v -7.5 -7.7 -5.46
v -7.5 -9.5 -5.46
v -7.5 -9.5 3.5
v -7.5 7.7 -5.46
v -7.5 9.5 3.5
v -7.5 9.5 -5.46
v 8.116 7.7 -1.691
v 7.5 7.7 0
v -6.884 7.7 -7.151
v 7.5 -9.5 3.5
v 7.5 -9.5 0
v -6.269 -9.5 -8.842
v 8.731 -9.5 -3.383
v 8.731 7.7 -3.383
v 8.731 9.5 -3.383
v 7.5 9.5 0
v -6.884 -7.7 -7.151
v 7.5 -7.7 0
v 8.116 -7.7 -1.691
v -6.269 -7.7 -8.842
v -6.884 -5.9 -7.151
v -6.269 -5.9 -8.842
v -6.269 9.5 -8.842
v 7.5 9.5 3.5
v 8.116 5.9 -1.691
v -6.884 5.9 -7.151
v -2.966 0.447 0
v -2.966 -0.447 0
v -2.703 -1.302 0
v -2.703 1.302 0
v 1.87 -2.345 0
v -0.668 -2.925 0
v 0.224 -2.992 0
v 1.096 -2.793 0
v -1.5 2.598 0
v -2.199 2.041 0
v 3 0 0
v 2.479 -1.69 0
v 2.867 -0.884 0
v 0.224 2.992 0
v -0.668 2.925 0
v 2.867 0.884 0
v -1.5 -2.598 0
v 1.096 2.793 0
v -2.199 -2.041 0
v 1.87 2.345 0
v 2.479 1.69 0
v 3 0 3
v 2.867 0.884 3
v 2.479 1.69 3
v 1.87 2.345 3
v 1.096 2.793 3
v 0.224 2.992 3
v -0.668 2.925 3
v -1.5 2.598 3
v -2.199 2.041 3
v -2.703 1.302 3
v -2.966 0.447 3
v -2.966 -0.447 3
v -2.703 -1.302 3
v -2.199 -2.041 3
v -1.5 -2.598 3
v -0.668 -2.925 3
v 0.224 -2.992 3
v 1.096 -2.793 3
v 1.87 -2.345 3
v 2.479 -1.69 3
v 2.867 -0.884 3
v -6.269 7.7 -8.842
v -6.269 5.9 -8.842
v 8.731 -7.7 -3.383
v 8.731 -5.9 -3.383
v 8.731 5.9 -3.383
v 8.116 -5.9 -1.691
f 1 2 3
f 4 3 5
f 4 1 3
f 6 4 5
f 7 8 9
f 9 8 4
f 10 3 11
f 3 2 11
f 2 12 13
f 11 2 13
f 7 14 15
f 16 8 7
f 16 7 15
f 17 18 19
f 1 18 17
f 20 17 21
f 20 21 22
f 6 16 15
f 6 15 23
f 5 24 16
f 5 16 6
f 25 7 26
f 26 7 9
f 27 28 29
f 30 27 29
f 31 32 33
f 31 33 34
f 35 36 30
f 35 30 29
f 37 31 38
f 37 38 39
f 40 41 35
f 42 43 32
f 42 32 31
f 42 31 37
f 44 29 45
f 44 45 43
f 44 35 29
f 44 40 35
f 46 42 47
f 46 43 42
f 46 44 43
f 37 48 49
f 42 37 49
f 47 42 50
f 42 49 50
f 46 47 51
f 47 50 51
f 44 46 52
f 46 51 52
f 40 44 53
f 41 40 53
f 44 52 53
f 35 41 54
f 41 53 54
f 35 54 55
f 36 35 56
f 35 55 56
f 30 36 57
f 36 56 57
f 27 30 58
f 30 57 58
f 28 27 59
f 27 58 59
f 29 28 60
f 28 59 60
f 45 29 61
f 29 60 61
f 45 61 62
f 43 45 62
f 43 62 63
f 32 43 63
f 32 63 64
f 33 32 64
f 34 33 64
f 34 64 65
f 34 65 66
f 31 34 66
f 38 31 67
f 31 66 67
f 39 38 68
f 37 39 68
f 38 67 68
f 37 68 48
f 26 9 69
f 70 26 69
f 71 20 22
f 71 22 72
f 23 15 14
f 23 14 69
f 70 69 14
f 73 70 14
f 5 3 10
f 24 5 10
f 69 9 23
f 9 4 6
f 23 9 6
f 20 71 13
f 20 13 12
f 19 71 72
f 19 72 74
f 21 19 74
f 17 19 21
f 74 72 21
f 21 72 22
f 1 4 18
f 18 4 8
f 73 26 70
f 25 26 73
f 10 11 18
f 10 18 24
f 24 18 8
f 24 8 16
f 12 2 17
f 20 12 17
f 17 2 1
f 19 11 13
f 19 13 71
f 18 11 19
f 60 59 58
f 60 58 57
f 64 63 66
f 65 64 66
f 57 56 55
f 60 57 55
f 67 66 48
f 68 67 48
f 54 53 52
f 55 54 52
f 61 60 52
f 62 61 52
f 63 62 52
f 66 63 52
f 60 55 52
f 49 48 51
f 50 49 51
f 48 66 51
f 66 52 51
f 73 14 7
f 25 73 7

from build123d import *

# Parameters (mm, degrees)
SKIZZE1_W                       = 15
SKIZZE1_H                       = 19
AUFSATZ_LINEAR_AUSTRAGEN1_DEPTH = 3
AUFSATZ_LINEAR_AUSTRAGEN2_DEPTH = 19
SKIZZE5_R                       = 3
SCHNITT_LINEAR_AUSTRAGEN1_DEPTH = 3
SKIZZE6_W                       = 15
SKIZZE6_H                       = 19
AUFSATZ_LINEAR_AUSTRAGEN3_DEPTH = 0.5
SKIZZE7_W                       = 15.962666587
SKIZZE7_H                       = 1.8
AUFSATZ_LINEAR_AUSTRAGEN4_DEPTH = 3.6
AUFSATZ_LINEAR_AUSTRAGEN5_DEPTH = 1.8
AUFSATZ_LINEAR_AUSTRAGEN6_DEPTH = 1.8


with BuildPart() as part:
    # Skizze1 → Aufsatz-Linear austragen1 (new body)
    with BuildSketch(Plane.XY):
        Rectangle(SKIZZE1_W, SKIZZE1_H)
    extrude(amount=AUFSATZ_LINEAR_AUSTRAGEN1_DEPTH)

    # Skizze3 → Aufsatz-Linear austragen2 (add)
    with BuildSketch(Plane(origin=(0, 9.5, 0), x_dir=(1, 0, 0), z_dir=(0, 1, 0))):
        Polygon((-7.5, 0), (-7.5, 5.459553514), (7.5, 0), align=None)
    extrude(amount=-AUFSATZ_LINEAR_AUSTRAGEN2_DEPTH)

    # Skizze5 → Schnitt-Linear austragen1 (cut)
    with BuildSketch(Plane.XY.offset(3)):
        Circle(SKIZZE5_R)
    extrude(amount=-SCHNITT_LINEAR_AUSTRAGEN1_DEPTH, mode=Mode.SUBTRACT)

    # Skizze6 → Aufsatz-Linear austragen3 (add)
    with BuildSketch(Plane.XY.offset(3)):
        Rectangle(SKIZZE6_W, SKIZZE6_H)
    extrude(amount=AUFSATZ_LINEAR_AUSTRAGEN3_DEPTH)

    # Skizze7 → Aufsatz-Linear austragen4 (add)
    with BuildSketch(Plane(origin=(0.877333338, 0, -2.410453536), x_dir=(-0.939692621, 0, -0.342020143), z_dir=(0.342020143, 0, -0.939692621))):
        with Locations((0.933638638, 8.6)):
            Rectangle(SKIZZE7_W, SKIZZE7_H)
        with Locations((0.933638638, -8.6)):
            Rectangle(SKIZZE7_W, SKIZZE7_H)
    extrude(amount=AUFSATZ_LINEAR_AUSTRAGEN4_DEPTH)

    # Skizze10 → Aufsatz-Linear austragen5 (add)
    with BuildSketch(Plane.XZ.offset(-7.7)):
        Polygon((8.731272516, -3.382893435), (8.115636258, -1.691446717), (-6.884363742, -7.151000231), (-6.268727484, -8.842446949), align=None)
    extrude(amount=AUFSATZ_LINEAR_AUSTRAGEN5_DEPTH)

    # Skizze9 → Aufsatz-Linear austragen6 (add)
    with BuildSketch(Plane(origin=(0, -7.7, 0), x_dir=(1, 0, 0), z_dir=(0, 1, 0))):
        Polygon((8.115636258, 1.691446717), (-6.884363742, 7.151000231), (-6.268727484, 8.842446949), (8.731272516, 3.382893435), align=None)
    extrude(amount=AUFSATZ_LINEAR_AUSTRAGEN6_DEPTH)


solid = part.part
